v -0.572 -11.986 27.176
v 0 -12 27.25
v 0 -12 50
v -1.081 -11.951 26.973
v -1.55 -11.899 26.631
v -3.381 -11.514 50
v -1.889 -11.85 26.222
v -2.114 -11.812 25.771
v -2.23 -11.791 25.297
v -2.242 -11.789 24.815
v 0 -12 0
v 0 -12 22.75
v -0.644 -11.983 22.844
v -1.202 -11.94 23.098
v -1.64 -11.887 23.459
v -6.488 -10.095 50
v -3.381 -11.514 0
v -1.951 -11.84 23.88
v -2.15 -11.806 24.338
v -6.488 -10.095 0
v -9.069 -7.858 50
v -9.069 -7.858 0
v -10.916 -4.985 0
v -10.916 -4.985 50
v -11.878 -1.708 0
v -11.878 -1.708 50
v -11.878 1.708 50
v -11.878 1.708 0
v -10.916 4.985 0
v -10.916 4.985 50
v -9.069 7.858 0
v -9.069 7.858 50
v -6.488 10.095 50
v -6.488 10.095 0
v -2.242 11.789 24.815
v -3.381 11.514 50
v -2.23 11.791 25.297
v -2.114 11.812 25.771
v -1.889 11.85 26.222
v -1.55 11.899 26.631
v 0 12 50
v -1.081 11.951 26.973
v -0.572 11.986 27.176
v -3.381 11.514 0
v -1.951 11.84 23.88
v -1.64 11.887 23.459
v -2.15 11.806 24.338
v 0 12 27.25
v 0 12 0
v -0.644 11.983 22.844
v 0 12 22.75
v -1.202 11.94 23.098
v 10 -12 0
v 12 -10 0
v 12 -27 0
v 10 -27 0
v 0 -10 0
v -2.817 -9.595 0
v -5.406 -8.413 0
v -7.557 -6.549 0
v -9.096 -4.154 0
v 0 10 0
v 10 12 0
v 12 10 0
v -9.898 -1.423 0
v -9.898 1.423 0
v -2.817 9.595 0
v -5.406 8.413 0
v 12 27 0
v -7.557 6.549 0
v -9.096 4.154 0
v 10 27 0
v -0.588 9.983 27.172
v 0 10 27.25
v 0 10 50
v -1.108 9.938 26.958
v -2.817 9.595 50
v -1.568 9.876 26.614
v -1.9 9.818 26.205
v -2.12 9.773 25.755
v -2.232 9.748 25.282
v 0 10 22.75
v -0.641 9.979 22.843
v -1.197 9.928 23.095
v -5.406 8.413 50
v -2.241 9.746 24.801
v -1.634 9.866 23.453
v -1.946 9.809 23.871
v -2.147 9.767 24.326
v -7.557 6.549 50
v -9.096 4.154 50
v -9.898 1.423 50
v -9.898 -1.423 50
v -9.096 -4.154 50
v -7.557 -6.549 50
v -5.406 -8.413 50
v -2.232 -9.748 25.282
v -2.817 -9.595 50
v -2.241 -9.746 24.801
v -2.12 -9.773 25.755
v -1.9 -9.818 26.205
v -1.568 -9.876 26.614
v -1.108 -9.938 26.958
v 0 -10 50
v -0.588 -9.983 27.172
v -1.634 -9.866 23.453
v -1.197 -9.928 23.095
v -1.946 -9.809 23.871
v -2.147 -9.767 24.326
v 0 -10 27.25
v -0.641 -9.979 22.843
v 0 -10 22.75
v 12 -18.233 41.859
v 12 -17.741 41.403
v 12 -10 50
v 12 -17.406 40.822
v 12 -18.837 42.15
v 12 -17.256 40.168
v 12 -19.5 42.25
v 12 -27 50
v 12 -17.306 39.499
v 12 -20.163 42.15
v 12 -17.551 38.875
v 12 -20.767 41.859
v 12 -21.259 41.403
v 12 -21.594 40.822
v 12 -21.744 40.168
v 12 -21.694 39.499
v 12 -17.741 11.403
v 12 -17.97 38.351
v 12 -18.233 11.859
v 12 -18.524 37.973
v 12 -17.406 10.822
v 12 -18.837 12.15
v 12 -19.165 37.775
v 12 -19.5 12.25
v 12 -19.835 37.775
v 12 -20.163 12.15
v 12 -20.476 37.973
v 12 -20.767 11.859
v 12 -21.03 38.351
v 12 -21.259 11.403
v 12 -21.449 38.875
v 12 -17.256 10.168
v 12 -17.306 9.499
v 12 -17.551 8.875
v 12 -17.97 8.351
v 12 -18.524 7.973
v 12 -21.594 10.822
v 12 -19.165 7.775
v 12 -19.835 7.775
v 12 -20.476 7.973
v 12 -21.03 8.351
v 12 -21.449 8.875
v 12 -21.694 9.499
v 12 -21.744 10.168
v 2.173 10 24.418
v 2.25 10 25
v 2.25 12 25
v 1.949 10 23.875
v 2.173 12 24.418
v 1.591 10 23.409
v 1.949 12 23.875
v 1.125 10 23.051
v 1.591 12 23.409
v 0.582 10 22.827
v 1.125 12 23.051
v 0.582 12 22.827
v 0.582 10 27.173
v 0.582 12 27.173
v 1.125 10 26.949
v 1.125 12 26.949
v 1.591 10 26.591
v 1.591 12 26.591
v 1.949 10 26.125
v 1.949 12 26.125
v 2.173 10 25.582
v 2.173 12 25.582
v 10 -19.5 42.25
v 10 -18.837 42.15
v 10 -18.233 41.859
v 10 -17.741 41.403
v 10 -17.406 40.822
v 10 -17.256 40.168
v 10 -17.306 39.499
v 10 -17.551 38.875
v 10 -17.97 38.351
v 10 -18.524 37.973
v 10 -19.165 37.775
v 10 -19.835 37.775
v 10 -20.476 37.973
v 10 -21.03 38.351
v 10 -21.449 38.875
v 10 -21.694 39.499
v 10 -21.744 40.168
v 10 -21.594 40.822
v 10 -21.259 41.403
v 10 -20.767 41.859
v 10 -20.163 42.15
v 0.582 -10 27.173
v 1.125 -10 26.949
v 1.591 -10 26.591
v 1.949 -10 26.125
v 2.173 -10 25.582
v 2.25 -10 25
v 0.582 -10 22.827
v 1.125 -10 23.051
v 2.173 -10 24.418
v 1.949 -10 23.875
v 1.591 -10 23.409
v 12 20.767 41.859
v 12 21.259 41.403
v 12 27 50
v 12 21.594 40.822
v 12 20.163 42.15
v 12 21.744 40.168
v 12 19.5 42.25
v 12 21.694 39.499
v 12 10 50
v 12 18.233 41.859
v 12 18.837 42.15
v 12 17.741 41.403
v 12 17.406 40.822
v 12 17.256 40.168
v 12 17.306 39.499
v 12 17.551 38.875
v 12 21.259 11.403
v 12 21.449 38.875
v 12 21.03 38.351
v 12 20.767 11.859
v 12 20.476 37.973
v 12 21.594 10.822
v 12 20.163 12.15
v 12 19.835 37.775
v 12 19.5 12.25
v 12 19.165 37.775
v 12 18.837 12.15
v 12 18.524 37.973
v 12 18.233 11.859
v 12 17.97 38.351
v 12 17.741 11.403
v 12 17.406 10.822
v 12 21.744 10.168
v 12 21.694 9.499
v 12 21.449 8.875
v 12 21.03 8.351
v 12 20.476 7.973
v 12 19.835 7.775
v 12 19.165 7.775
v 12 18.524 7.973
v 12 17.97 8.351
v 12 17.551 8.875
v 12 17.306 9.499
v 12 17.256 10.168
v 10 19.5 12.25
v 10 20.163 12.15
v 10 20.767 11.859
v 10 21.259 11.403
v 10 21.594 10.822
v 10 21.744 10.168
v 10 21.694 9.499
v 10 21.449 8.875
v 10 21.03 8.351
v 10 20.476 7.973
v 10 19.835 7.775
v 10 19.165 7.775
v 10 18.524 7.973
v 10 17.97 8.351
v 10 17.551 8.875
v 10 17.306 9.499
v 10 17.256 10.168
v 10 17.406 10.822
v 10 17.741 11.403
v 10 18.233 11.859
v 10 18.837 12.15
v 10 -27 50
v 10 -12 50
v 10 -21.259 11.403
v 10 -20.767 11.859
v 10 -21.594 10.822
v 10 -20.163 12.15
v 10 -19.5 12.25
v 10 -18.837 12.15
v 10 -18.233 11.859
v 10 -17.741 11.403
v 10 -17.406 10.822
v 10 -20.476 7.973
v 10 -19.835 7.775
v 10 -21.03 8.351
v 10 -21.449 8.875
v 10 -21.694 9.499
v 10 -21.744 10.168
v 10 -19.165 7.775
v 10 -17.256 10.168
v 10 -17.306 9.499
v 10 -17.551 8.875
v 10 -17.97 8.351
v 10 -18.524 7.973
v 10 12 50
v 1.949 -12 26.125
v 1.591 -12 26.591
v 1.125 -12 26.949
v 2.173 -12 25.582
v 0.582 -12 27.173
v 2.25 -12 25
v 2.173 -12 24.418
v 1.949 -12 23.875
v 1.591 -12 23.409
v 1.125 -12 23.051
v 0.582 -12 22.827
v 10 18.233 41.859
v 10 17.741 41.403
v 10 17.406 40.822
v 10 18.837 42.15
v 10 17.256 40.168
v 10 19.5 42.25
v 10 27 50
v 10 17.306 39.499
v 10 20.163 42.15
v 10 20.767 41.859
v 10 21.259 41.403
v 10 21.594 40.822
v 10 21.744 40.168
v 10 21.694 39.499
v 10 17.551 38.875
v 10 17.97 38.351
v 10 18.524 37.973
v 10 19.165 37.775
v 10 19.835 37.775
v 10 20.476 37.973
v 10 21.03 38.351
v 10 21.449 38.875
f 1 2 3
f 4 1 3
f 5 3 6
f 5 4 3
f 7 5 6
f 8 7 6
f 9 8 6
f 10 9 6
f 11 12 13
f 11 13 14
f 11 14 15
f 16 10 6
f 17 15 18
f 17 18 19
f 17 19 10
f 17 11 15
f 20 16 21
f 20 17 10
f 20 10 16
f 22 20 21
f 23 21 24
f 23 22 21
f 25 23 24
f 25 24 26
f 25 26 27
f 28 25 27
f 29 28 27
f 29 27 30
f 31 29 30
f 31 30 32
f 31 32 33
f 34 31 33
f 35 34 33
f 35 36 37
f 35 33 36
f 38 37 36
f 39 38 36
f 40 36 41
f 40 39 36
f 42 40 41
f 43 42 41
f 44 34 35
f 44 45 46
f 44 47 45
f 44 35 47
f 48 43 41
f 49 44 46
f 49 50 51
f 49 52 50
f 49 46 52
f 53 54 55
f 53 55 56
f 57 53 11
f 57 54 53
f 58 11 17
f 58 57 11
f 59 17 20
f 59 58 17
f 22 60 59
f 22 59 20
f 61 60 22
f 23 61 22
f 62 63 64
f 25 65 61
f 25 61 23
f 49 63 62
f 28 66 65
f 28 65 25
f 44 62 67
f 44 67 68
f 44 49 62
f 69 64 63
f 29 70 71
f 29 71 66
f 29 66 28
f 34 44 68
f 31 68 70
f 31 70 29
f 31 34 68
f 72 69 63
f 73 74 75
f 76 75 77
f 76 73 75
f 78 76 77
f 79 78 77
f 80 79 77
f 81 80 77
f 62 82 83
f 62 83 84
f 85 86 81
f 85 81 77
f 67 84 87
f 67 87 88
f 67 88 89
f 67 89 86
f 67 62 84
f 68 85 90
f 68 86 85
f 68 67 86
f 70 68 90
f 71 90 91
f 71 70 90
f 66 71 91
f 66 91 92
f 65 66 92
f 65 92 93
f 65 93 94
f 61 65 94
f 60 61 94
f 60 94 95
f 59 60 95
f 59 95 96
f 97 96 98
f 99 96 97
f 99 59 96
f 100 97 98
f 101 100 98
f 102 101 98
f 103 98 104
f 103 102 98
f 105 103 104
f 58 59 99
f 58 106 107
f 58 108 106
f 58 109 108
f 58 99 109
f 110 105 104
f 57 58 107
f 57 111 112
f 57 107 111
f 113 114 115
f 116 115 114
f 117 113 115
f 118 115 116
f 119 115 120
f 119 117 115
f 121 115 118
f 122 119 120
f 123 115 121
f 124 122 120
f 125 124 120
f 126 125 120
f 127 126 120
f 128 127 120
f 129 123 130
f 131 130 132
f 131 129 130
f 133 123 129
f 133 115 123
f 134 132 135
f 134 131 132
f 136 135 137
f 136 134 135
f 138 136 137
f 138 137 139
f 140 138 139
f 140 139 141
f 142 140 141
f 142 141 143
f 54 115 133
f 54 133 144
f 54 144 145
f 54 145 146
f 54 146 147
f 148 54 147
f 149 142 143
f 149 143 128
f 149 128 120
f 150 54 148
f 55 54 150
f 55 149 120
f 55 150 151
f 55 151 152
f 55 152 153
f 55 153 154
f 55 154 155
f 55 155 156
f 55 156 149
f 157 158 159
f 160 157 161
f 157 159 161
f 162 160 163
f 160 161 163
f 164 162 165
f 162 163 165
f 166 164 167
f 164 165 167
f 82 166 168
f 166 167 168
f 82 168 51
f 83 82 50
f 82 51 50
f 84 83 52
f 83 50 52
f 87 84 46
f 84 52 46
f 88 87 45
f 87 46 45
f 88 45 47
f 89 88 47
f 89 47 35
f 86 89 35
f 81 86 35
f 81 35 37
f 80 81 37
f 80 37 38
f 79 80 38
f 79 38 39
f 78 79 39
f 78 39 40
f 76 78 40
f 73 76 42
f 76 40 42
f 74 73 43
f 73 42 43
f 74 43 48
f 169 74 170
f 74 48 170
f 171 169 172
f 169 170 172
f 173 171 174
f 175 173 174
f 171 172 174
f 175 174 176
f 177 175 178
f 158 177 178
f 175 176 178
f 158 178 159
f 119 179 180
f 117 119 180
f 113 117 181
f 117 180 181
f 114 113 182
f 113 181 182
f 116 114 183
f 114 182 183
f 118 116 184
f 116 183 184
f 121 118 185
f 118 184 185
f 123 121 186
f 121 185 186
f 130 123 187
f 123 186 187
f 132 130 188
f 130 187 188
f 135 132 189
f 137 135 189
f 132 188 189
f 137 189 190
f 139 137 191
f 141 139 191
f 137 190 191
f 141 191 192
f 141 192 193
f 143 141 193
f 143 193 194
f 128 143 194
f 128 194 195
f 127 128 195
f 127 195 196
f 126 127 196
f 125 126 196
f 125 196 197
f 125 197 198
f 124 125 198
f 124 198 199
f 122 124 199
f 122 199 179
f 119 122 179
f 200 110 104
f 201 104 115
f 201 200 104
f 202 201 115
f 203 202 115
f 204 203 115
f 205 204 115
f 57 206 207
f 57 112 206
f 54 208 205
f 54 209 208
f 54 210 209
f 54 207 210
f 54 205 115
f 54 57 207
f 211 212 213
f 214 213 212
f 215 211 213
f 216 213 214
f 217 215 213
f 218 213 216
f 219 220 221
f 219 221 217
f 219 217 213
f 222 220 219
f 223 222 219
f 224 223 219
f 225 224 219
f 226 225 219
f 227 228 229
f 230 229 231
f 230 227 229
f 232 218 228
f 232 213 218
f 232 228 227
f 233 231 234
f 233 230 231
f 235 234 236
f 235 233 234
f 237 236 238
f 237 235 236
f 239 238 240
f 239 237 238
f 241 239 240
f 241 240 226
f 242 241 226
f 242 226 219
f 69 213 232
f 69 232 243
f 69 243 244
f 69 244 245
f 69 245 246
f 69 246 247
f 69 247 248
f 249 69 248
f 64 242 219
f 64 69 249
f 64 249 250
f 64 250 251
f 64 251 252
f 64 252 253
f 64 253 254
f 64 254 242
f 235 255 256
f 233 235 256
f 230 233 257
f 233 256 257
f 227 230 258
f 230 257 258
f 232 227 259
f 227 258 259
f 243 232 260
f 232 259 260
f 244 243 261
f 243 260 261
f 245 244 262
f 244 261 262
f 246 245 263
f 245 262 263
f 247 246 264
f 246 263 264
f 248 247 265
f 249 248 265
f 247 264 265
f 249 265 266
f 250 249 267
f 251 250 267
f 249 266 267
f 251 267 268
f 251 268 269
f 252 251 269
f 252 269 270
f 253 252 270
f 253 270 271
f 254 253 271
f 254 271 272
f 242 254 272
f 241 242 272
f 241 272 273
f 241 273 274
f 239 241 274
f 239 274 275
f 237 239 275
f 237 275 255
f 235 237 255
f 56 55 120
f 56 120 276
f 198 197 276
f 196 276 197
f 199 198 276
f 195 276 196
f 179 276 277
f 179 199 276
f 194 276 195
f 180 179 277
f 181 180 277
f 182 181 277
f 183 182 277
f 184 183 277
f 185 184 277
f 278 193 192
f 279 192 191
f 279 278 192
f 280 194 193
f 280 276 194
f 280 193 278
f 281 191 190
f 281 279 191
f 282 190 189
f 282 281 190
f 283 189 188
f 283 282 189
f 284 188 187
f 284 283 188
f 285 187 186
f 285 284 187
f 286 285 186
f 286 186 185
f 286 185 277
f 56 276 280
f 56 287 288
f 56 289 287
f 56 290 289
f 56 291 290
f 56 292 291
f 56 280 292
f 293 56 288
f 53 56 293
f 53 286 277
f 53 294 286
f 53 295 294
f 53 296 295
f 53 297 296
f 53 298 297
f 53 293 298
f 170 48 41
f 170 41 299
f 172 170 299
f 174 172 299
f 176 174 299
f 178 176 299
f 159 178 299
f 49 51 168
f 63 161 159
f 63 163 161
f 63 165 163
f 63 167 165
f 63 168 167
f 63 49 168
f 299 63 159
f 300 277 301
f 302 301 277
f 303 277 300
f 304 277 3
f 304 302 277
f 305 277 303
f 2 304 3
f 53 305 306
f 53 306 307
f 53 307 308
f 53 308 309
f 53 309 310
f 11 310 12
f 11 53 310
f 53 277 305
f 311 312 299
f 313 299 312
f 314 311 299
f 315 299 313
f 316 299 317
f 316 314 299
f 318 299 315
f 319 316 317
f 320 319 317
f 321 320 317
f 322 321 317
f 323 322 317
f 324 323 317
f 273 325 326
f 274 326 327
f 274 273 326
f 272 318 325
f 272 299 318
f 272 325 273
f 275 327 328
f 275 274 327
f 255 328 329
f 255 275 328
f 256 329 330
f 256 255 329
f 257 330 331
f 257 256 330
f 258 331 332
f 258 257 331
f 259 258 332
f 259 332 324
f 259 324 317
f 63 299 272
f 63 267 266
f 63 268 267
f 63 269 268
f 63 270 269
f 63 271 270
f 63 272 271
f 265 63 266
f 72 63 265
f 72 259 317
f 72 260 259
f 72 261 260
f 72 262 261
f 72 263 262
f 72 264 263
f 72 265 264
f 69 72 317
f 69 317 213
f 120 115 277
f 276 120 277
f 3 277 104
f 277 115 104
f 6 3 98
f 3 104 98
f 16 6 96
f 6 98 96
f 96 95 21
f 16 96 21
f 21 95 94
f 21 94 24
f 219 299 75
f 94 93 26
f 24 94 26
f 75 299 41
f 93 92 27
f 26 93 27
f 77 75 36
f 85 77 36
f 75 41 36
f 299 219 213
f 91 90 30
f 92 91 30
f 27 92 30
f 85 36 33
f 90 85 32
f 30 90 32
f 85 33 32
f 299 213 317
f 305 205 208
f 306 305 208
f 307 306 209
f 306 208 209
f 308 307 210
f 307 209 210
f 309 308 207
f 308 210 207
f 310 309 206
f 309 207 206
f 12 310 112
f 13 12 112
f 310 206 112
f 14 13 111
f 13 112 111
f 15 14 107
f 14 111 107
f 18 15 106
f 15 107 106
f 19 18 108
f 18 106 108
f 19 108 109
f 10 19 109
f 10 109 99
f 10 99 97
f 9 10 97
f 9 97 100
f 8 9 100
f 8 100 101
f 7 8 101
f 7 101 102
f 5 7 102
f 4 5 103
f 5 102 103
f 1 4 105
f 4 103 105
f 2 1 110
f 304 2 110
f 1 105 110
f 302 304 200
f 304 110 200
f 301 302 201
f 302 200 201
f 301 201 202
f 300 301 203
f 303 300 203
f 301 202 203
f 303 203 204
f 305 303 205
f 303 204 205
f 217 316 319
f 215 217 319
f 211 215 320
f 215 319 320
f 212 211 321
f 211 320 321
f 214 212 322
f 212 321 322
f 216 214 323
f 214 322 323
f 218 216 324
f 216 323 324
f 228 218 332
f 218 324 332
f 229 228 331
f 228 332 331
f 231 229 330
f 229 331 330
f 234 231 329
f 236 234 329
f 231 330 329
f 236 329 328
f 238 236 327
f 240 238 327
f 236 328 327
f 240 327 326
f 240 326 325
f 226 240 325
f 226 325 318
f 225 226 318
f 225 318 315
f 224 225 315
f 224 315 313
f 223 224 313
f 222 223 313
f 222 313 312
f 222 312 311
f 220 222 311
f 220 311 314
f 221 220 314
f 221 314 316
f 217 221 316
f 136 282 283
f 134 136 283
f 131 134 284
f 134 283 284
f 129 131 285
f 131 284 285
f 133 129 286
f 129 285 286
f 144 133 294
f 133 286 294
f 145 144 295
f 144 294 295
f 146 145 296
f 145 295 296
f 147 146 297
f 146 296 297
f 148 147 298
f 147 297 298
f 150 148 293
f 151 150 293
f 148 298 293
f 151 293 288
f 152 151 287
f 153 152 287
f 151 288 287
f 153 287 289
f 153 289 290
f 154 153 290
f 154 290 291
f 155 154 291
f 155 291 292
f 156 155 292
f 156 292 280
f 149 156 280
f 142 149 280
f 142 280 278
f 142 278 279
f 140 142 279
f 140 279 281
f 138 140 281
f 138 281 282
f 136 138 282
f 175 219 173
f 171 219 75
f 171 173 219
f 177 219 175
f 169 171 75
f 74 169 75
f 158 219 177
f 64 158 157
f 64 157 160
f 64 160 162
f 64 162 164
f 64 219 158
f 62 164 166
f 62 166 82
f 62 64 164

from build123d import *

# Parameters (mm, degrees)
BOSS_EXTRUDE1_DEPTH = 50
SKETCH2_R           = 2.25
CUT_EXTRUDE1_DEPTH  = 24
CUT_EXTRUDE2_REACH  = 4
SKETCH3_R           = 2.25


with BuildPart() as part:
    # Sketch1 → Boss-Extrude1 (new body)
    with BuildSketch(Plane.XY):
        with BuildLine():
            Line((0, 12), (10, 12))
            Line((10, 12), (10, 27))
            Line((10, 27), (12, 27))
            Line((12, 27), (12, 10))
            Line((12, 10), (0, 10))
            ThreePointArc((0, 10), (-10, 0), (0, -10))
            Line((0, -10), (12, -10))
            Line((12, -10), (12, -27))
            Line((12, -27), (10, -27))
            Line((10, -27), (10, -12))
            Line((10, -12), (0, -12))
            ThreePointArc((0, -12), (-12, 0), (0, 12))
        make_face()
    extrude(amount=BOSS_EXTRUDE1_DEPTH)

    # Sketch2 → Cut-Extrude1 (cut)
    with BuildSketch(Plane(origin=(0, 12, 0), x_dir=(1, 0, 0), z_dir=(0, 1, 0))):
        with Locations((0, -25)):
            Circle(SKETCH2_R)
    extrude(amount=-CUT_EXTRUDE1_DEPTH, mode=Mode.SUBTRACT)

    # Sketch3 → Cut-Extrude2 (cut, up to next)
    with BuildSketch(Plane.ZY.offset(-10), mode=Mode.PRIVATE) as cut_extrude2_sk1:
        with Locations((10, 19.5)):
            Circle(SKETCH3_R)
    cut_extrude2_tool1 = extrude(cut_extrude2_sk1.sketch, amount=-CUT_EXTRUDE2_REACH, mode=Mode.PRIVATE) & part.part
    add(cut_extrude2_tool1.solids().sort_by_distance((10, 19.5, 10))[0], mode=Mode.SUBTRACT)
    # Sketch3 → Cut-Extrude2 (cut, up to next)
    with BuildSketch(Plane.ZY.offset(-10), mode=Mode.PRIVATE) as cut_extrude2_sk2:
        with Locations((40, 19.5)):
            Circle(SKETCH3_R)
    cut_extrude2_tool2 = extrude(cut_extrude2_sk2.sketch, amount=-CUT_EXTRUDE2_REACH, mode=Mode.PRIVATE) & part.part
    add(cut_extrude2_tool2.solids().sort_by_distance((10, 19.5, 40))[0], mode=Mode.SUBTRACT)
    # Sketch3 → Cut-Extrude2 (cut, up to next)
    with BuildSketch(Plane.ZY.offset(-10), mode=Mode.PRIVATE) as cut_extrude2_sk3:
        with Locations((40, -19.5)):
            Circle(SKETCH3_R)
    cut_extrude2_tool3 = extrude(cut_extrude2_sk3.sketch, amount=-CUT_EXTRUDE2_REACH, mode=Mode.PRIVATE) & part.part
    add(cut_extrude2_tool3.solids().sort_by_distance((10, -19.5, 40))[0], mode=Mode.SUBTRACT)
    # Sketch3 → Cut-Extrude2 (cut, up to next)
    with BuildSketch(Plane.ZY.offset(-10), mode=Mode.PRIVATE) as cut_extrude2_sk4:
        with Locations((10, -19.5)):
            Circle(SKETCH3_R)
    cut_extrude2_tool4 = extrude(cut_extrude2_sk4.sketch, amount=-CUT_EXTRUDE2_REACH, mode=Mode.PRIVATE) & part.part
    add(cut_extrude2_tool4.solids().sort_by_distance((10, -19.5, 10))[0], mode=Mode.SUBTRACT)


solid = part.part
